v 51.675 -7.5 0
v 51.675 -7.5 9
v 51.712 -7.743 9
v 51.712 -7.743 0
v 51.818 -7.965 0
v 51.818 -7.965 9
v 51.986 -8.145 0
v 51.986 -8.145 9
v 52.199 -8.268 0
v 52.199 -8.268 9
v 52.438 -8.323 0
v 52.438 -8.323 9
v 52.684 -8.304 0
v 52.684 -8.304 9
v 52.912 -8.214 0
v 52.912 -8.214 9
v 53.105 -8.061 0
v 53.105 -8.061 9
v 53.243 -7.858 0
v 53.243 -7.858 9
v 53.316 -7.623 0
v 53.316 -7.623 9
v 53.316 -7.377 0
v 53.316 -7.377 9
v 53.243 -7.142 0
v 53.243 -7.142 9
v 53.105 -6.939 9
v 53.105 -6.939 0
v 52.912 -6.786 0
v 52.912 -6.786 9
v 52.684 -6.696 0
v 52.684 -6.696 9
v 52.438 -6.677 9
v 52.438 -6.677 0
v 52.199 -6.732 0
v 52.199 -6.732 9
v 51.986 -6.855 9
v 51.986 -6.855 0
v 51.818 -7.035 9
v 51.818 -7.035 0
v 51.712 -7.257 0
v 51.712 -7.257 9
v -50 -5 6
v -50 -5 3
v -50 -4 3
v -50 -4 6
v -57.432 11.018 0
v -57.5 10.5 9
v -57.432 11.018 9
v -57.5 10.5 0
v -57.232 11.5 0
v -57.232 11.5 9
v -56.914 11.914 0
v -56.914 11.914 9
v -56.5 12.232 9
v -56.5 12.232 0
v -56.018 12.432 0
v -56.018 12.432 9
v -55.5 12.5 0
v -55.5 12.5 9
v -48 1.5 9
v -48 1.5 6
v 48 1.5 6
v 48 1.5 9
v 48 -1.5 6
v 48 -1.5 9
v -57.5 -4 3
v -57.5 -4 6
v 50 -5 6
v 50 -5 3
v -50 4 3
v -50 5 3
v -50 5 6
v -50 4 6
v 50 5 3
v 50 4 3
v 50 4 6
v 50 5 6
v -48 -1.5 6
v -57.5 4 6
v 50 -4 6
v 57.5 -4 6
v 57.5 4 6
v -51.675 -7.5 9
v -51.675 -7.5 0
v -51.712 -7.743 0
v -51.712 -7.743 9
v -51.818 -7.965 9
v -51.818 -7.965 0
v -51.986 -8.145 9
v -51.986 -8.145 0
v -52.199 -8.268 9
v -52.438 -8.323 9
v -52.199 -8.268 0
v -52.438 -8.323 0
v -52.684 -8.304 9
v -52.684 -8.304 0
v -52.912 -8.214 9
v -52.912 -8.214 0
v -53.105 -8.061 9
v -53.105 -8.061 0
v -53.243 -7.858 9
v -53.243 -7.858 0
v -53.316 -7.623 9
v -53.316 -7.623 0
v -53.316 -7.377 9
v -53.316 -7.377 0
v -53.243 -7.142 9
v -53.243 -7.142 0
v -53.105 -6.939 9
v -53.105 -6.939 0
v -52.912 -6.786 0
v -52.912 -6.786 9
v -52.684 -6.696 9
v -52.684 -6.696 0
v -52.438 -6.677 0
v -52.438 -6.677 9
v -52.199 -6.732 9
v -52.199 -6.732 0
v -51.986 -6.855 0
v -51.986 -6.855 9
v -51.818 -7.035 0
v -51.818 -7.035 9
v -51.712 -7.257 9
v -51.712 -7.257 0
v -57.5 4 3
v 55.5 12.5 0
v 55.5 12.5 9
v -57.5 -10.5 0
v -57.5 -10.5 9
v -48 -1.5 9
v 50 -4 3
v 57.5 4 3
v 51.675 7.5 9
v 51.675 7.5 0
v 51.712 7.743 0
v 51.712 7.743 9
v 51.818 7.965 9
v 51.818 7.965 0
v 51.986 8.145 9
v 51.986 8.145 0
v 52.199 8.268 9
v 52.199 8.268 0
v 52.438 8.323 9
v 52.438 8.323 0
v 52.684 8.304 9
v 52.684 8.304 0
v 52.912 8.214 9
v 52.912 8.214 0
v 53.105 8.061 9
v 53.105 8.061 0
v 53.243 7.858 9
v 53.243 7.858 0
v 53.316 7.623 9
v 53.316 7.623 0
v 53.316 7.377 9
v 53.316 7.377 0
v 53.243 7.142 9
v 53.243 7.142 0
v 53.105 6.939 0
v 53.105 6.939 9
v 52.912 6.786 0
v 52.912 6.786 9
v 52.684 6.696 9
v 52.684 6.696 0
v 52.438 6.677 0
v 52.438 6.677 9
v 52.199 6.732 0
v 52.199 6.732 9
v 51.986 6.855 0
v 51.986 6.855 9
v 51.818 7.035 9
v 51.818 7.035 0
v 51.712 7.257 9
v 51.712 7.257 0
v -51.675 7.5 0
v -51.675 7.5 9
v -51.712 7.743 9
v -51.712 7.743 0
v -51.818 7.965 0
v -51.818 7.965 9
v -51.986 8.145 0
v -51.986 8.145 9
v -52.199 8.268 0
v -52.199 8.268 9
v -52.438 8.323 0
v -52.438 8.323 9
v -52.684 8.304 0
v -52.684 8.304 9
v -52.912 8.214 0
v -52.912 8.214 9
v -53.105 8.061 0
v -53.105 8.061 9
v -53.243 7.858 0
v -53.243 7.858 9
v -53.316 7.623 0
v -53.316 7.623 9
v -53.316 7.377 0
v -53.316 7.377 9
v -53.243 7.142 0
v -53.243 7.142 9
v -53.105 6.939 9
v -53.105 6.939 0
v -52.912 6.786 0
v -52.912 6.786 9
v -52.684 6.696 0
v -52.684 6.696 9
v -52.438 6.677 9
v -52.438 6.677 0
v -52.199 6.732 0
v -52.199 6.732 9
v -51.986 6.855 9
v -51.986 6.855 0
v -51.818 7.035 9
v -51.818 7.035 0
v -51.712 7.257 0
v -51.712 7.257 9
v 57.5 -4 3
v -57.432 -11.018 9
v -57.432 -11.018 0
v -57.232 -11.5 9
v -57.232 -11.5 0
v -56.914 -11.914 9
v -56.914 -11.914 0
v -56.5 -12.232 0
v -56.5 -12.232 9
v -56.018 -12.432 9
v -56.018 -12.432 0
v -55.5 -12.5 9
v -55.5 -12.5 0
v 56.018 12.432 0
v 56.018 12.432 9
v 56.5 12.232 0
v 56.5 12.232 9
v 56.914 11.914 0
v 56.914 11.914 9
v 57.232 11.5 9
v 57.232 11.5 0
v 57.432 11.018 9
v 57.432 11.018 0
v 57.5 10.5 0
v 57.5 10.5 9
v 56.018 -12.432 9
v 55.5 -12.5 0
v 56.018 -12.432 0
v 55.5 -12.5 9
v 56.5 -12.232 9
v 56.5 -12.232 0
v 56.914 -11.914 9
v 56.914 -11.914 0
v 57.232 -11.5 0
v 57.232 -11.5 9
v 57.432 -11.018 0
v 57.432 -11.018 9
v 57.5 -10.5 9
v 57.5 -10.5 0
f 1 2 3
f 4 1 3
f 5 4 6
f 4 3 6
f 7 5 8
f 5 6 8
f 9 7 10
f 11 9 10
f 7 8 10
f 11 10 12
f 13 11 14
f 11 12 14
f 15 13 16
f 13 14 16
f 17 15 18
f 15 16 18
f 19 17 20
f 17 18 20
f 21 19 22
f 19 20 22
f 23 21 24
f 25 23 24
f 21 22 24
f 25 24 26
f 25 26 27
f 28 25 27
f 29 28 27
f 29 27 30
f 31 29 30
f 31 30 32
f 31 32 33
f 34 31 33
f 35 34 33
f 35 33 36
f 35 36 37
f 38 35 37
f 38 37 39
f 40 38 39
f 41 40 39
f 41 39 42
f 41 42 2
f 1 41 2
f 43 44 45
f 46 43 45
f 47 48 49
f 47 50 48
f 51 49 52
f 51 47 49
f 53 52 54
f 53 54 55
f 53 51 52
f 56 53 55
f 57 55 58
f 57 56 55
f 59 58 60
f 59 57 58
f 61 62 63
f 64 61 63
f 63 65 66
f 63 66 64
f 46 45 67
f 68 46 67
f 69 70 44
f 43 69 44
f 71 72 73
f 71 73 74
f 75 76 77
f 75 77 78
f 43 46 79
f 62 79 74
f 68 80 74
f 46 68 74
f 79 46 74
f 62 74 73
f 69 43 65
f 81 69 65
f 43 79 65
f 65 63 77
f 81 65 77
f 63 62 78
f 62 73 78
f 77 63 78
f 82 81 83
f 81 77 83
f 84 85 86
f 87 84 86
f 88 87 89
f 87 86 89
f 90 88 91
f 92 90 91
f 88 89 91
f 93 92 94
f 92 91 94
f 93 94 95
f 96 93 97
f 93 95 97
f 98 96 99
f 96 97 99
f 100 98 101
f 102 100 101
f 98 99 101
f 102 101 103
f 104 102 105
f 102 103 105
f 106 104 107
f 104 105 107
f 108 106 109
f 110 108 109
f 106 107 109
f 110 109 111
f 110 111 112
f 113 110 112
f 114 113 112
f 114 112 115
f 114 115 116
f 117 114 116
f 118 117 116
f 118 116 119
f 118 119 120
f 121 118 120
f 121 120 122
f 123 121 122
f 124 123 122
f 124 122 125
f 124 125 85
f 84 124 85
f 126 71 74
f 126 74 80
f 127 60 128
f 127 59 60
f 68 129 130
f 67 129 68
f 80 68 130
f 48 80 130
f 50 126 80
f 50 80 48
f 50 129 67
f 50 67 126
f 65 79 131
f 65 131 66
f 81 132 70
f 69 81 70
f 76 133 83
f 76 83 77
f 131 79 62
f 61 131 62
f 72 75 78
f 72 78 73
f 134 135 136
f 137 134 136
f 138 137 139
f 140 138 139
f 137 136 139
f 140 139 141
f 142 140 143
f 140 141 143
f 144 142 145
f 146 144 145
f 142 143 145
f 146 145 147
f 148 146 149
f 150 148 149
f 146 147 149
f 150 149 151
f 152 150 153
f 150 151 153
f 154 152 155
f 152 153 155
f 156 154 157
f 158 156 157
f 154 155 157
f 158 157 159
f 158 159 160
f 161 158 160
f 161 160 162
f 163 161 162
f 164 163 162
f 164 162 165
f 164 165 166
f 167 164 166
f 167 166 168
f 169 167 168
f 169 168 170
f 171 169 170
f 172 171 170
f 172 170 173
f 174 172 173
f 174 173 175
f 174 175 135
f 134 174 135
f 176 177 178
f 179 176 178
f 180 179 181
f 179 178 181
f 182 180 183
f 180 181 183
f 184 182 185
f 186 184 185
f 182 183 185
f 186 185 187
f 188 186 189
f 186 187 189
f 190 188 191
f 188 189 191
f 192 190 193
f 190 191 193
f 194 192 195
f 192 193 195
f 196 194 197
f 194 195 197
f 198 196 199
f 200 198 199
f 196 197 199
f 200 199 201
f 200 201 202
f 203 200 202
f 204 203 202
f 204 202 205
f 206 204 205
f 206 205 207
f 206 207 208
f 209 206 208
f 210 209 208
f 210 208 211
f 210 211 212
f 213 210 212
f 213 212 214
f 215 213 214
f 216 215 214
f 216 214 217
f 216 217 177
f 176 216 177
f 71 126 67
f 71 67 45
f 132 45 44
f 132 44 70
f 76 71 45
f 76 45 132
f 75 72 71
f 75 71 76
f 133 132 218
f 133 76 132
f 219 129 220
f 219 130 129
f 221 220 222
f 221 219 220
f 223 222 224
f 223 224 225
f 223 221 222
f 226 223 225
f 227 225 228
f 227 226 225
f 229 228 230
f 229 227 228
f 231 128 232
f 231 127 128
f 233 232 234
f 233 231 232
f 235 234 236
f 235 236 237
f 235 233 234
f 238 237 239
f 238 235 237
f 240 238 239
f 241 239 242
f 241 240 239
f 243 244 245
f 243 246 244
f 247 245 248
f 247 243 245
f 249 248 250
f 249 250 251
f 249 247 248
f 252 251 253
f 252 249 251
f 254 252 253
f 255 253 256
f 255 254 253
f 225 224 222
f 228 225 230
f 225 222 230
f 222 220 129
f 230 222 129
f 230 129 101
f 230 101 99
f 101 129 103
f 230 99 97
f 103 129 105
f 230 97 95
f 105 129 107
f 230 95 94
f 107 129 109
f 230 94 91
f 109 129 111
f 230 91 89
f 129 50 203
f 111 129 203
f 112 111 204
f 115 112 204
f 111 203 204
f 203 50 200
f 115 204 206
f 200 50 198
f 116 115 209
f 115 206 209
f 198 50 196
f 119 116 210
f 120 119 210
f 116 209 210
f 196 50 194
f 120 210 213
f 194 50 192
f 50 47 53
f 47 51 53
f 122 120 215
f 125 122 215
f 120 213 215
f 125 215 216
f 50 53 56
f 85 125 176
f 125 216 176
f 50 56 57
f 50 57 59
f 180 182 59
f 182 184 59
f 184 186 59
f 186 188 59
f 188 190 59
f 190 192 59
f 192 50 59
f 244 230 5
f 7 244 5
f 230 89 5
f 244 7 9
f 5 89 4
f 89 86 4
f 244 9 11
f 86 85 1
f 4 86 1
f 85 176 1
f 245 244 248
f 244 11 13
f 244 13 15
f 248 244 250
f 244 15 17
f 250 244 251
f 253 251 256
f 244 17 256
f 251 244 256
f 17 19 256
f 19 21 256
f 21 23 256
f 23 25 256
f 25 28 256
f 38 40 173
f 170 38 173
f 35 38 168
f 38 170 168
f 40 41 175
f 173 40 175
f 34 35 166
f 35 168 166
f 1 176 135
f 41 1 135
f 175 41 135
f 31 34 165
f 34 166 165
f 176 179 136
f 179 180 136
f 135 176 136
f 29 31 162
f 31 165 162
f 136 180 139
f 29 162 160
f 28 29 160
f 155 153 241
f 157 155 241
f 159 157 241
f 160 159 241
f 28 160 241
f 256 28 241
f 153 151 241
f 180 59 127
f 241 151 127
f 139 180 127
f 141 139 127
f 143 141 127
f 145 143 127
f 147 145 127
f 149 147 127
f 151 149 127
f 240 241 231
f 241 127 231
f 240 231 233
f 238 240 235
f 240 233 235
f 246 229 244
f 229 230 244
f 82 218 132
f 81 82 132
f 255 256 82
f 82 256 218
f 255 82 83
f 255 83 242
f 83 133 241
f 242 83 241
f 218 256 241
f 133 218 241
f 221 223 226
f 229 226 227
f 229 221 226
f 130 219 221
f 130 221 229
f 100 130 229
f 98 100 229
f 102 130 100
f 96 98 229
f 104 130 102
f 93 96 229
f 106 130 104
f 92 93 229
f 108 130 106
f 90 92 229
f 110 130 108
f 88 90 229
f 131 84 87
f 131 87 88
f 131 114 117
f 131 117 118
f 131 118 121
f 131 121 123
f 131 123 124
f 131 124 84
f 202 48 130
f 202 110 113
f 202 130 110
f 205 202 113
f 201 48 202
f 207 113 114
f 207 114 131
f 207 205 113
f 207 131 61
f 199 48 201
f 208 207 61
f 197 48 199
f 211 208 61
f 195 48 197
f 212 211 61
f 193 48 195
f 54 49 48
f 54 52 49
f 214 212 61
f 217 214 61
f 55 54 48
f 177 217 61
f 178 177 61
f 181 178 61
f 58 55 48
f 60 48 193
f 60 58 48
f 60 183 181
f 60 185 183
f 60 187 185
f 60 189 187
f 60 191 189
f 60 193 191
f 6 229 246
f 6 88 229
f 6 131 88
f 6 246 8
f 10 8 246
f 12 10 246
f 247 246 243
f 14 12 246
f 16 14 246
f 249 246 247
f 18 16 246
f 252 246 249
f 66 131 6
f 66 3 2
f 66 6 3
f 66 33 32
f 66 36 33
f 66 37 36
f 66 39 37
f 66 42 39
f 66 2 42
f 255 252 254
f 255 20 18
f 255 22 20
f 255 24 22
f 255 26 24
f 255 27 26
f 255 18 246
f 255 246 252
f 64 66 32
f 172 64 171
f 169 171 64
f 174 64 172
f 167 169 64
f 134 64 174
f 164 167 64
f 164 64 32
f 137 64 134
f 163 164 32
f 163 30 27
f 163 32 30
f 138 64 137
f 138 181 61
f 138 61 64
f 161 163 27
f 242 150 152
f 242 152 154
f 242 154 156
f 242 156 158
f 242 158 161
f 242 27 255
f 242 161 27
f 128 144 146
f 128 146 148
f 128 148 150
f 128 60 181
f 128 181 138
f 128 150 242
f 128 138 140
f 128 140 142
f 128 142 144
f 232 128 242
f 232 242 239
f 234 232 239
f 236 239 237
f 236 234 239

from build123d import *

# Parameters (mm, degrees)
SKETCH_W              = 115
SKETCH_H              = 25
PAD_DEPTH             = 3
PAD001_DEPTH          = 3
SKETCH002_W           = 115
SKETCH002_H           = 25
SKETCH002_W_2         = 96
SKETCH002_H_2         = 3
PAD002_DEPTH          = 3
SKETCH003_R           = 0.825
POCKET_DEPTH          = 245.060315
POLARPATTERN_COUNT    = 2
POLARPATTERN001_COUNT = 2
POLARPATTERN002_COUNT = 2
FILLET_R              = 2


with BuildPart() as part:
    # Sketch → Pad (new body)
    with BuildSketch(Plane.XY):
        Rectangle(SKETCH_W, SKETCH_H)
    extrude(amount=PAD_DEPTH)

    # Sketch001 (on Face6 of Pad) → Pad001 (join)
    with BuildSketch(Plane.XY.offset(3)):
        Polygon((-57.5, 12.5), (57.5, 12.5), (57.5, 4), (50, 4), (50, 5), (-50, 5), (-50, 4), (-57.5, 4), align=None)
        Polygon((-57.5, -12.5), (57.5, -12.5), (57.5, -4), (50, -4), (50, -5), (-50, -5), (-50, -4), (-57.5, -4), align=None)
    extrude(amount=PAD001_DEPTH)

    # Sketch002 (on Face12 of Pad001) → Pad002 (join)
    with BuildSketch(Plane.XY.offset(6)):
        Rectangle(SKETCH002_W, SKETCH002_H)
        Rectangle(SKETCH002_W_2, SKETCH002_H_2, mode=Mode.SUBTRACT)
    extrude(amount=PAD002_DEPTH)

    # Sketch003 (on Face26 of Pad002) → Pocket (cut, through all)
    with BuildSketch(Plane.XY.offset(9)):
        with Locations((-52.5, 7.5)):
            Circle(SKETCH003_R)
    pocket = extrude(amount=-POCKET_DEPTH, mode=Mode.SUBTRACT)

    # PolarPattern: Pocket ×2 about axis
    polarpattern_axis = Axis((0, 0, 0), (0, 1, 0))
    for i in range(1, POLARPATTERN_COUNT):
        add(pocket.rotate(polarpattern_axis, i * 360 / POLARPATTERN_COUNT), mode=Mode.SUBTRACT)

    # PolarPattern001: Pocket ×2 about axis
    polarpattern001_axis = Axis((0, 0, 0), (1, 0, 0))
    for i in range(1, POLARPATTERN001_COUNT):
        add(pocket.rotate(polarpattern001_axis, i * 360 / POLARPATTERN001_COUNT), mode=Mode.SUBTRACT)

    # PolarPattern002: Pocket ×2 about axis
    polarpattern002_axis = Axis((0, 0, 9), (0, 0, 1))
    for i in range(1, POLARPATTERN002_COUNT):
        add(pocket.rotate(polarpattern002_axis, i * 360 / POLARPATTERN002_COUNT), mode=Mode.SUBTRACT)

    # Fillet
    fillet_edges = [part.edges().sort_by_distance(p)[0] for p in [
        (57.5, 12.5, 7.5),
        (57.5, 12.5, 4.5),
        (57.5, 12.5, 1.5),
        (57.5, -12.5, 7.5),
        (-57.5, 12.5, 7.5),
        (-57.5, -12.5, 7.5),
    ]]
    fillet(fillet_edges, radius=FILLET_R)


solid = part.part
